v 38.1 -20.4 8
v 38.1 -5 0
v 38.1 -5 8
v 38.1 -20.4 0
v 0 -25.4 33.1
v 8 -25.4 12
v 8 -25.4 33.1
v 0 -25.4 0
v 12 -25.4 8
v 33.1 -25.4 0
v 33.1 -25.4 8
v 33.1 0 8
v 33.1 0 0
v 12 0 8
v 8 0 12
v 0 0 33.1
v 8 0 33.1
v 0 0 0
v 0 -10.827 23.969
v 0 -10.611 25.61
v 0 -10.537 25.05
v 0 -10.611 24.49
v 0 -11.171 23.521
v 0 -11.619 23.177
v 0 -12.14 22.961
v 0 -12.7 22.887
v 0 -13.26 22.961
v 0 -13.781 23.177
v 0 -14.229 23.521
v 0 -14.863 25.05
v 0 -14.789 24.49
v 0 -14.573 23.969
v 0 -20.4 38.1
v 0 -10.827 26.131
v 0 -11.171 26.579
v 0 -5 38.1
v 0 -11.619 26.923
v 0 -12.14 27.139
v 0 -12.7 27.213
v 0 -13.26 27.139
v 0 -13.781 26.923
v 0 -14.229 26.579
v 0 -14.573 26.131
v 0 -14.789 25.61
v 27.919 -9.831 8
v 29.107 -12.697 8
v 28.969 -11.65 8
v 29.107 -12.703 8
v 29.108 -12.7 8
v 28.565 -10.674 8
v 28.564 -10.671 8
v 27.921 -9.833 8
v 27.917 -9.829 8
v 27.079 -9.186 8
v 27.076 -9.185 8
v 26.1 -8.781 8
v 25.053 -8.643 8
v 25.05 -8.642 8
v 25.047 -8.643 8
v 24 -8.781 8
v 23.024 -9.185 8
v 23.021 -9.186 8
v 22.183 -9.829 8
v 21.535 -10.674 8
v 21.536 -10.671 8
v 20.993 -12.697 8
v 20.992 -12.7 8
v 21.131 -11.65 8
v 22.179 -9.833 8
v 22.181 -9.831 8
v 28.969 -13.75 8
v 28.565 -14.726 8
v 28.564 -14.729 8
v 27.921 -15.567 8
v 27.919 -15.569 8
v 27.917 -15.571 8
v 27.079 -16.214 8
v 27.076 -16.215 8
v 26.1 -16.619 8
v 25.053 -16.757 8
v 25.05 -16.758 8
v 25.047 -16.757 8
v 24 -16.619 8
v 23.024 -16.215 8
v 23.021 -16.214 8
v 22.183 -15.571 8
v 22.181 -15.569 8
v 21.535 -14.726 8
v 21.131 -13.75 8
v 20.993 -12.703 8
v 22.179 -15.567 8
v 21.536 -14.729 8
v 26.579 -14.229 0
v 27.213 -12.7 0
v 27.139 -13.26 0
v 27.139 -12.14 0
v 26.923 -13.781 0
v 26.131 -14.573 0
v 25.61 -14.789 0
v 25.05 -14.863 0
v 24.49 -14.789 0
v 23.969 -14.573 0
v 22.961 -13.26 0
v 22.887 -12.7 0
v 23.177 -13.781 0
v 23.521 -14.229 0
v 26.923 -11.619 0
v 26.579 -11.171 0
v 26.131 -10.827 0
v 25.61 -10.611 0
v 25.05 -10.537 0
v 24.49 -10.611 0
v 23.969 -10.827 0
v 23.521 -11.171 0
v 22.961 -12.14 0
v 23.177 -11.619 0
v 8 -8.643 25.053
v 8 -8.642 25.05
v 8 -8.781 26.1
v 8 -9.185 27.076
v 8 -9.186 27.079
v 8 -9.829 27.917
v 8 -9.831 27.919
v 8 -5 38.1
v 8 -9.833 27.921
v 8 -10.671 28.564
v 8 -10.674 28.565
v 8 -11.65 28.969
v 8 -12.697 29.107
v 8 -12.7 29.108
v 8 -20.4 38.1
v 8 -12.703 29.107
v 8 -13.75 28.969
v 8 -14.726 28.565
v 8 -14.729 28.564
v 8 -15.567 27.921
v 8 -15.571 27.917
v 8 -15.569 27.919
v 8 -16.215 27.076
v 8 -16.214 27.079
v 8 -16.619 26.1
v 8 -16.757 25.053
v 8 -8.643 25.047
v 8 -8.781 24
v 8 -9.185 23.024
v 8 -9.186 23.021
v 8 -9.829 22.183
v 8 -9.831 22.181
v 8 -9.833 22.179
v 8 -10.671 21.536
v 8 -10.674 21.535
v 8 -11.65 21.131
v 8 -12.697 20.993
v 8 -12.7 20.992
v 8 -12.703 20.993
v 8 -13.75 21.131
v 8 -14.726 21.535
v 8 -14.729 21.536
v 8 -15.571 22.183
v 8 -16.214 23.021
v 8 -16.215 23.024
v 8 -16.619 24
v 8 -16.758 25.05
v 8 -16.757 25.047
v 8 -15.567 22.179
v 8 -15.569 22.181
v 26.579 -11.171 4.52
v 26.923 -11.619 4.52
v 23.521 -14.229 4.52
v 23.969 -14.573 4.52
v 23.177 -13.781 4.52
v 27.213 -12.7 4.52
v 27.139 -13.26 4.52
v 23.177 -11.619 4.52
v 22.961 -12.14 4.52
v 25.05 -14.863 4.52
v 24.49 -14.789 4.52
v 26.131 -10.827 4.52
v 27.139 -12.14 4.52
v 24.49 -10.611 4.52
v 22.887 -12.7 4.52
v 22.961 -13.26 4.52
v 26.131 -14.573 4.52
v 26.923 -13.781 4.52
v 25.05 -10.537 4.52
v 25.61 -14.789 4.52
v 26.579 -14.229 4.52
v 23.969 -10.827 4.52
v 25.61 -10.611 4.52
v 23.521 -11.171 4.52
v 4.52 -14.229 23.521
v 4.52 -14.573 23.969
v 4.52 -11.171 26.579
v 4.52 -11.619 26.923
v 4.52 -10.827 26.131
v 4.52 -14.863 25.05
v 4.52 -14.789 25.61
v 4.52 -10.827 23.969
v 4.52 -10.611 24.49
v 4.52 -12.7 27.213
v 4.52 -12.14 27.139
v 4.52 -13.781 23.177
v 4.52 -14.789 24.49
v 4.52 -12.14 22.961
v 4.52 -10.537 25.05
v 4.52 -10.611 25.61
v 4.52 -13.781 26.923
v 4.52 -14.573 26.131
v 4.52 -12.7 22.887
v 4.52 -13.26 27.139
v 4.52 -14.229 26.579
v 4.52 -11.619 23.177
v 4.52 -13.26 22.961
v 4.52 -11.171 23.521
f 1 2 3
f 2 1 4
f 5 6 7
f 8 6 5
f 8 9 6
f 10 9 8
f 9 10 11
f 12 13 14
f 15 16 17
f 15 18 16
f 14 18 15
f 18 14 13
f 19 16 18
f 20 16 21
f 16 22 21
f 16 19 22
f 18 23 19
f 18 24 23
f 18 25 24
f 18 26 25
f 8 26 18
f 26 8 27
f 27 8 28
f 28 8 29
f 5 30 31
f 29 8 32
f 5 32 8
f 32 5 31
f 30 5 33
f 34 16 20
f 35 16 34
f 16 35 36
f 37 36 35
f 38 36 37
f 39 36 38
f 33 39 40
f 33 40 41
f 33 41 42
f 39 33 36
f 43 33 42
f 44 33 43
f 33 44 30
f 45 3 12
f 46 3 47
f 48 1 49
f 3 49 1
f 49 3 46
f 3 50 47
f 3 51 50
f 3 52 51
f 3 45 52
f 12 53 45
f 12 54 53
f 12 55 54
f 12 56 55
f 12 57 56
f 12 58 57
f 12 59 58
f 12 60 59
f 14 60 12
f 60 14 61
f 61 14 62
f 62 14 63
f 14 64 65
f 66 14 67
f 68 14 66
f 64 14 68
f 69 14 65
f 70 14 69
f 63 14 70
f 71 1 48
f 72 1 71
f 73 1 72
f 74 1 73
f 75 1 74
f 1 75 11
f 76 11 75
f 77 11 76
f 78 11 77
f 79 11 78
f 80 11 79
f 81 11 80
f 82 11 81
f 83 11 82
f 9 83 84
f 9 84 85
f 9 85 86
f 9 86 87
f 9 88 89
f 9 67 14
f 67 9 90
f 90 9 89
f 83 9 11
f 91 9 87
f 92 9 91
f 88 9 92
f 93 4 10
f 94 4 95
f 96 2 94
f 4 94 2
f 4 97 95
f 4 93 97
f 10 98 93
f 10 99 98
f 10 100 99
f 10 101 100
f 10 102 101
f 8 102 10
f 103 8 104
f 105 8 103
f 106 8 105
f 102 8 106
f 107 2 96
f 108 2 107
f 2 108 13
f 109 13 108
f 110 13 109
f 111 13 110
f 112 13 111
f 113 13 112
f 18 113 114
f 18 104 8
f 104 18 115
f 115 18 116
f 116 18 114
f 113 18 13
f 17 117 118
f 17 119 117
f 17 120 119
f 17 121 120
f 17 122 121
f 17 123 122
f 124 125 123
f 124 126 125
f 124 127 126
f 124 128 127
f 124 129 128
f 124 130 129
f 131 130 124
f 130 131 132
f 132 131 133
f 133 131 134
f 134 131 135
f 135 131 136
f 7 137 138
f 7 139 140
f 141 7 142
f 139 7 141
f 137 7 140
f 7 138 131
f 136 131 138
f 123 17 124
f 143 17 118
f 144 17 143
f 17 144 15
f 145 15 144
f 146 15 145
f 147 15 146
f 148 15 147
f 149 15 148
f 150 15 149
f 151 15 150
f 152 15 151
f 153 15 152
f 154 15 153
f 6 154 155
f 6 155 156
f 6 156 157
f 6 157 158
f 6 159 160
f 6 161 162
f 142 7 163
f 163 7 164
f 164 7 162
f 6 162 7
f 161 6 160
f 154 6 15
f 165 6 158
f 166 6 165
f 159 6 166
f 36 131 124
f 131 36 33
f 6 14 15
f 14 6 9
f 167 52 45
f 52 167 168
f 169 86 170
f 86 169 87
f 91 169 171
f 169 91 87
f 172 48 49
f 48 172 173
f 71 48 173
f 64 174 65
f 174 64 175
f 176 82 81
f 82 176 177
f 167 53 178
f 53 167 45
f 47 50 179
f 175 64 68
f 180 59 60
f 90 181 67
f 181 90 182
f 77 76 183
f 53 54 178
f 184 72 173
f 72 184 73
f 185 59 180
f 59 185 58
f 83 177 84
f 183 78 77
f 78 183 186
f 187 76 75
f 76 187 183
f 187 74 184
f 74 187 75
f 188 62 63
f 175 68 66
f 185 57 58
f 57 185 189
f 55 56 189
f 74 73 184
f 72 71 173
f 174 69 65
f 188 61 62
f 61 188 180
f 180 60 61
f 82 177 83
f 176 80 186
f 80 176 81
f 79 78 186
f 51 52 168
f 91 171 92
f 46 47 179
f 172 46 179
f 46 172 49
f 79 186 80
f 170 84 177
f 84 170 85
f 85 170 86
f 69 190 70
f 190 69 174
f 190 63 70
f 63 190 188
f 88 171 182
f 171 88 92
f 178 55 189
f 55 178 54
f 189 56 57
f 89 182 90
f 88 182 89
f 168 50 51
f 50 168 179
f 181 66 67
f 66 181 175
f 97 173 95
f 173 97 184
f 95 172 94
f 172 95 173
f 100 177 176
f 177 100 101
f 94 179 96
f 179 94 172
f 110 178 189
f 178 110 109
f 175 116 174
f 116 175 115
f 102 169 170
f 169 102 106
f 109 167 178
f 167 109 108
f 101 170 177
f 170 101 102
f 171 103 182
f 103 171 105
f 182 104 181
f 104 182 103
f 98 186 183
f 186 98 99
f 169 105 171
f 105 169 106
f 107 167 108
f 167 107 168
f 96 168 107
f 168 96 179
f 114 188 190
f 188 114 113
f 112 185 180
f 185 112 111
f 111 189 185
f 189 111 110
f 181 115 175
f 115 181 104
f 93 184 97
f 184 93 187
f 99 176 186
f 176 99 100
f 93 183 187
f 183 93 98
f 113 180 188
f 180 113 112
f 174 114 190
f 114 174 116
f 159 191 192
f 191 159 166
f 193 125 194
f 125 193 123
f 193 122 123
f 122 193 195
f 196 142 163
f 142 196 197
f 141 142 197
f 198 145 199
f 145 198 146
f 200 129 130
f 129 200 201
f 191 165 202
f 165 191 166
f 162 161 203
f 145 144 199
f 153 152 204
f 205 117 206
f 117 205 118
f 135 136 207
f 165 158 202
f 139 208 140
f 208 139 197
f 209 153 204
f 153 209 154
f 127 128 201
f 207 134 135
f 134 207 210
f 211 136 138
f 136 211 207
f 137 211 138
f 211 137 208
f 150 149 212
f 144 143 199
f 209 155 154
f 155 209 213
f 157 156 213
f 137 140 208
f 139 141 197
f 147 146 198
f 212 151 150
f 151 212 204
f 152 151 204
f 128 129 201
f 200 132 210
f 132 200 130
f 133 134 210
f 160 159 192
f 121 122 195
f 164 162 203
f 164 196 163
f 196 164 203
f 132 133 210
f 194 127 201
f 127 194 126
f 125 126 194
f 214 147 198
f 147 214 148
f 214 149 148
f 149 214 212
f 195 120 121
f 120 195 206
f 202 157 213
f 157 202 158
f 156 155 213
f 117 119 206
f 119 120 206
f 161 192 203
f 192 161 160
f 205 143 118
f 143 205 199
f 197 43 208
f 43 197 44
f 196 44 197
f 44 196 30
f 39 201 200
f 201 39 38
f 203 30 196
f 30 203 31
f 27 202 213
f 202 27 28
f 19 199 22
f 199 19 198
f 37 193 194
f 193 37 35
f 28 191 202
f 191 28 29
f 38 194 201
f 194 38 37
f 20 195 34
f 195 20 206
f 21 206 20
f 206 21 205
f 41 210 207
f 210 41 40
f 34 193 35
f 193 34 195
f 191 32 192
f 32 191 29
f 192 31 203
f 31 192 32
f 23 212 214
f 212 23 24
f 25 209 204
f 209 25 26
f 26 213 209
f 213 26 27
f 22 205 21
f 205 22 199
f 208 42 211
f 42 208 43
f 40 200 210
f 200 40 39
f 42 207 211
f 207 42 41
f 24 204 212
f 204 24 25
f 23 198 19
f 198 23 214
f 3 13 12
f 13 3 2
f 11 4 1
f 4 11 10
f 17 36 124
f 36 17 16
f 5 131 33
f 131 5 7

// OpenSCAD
//Parametric L Bracket
//You can make this any length, Width, Height & Thickness you want
//You can also have 1, 2 or 4 screws on each leg of the L
//8/19/2015 By: David Bunch
//
//CUSTOMIZER VARIABLES

//1. Length of Part along 1st L
Len = 38.1;

//2. Width of L along 2nd L
Wid = 38.1;

//3. Height of L Bracket
Ht = 25.4;

//4. Thickness of Leg along X-Axis
Thk_X = 8;

//5. Thickness of Leg along Y-axis
Thk_Y = 8;

//6. Weld Diameter at L junction
WeldDia = 8;

//7. Chamfer Diameter at ends of L
ChamfDia = 10;

//8. Hole Diameter for Screws (#8 screw default)
HoleSize = 4.2;            //#10 Screws are 4.5 measured
                            //#8 Screws are 4.2 measured
                            //#6 Screws are 3.4 measured

//9. Dia. of Taper Head of Screw (#8 used for default)
TaperDia = 7.9;             //#10 Screws are a measured 9.0mm dia
                            //#8 Screws are a measured 7.95mm dia
                            //#6 Screws are a measured 6.45mm dia
//10. Taper Length Head of Screw (#8 used for default)
TaperLen = 3.5;            //#10 Screws are a measured 3.9mm taper
                            //#8 Screws are a measured 3.5mm taper
                            //#6 Screws are a measured 2.66mm taper
//11. Multiplication factor for Drill Holes
Tolerance = 1.03;  

//12. # of Screws on each side of L (1 or 2)
Screws_X = 1;                 //I split the distance by 3 for 2 screws

//13. # of Screws on each side of L (1 or 2)
Screws_Y = 1;                 //I split the distance by 3 for 2 screws

//14. # of Scres along Height of L (1 or 2)
Screws_Z = 1;

//15. Screw Height (I use 3/4" screws for default)
ScrewHt = 19.02;

//16. # of parts to make (1,2,3 or 4)
Parts = 1;

//CUSTOMIZER VARIABLES END

HoleOD = HoleSize * Tolerance;      //Calculated Hole Diameter
TapOD = TaperDia * Tolerance;       //Calculated Tapered Head Diameter
WeldRad = WeldDia / 2;              //Radius of Weld
Ht2 = Ht / (Screws_Z + 1);          //Half Height or 1/3 height if 2 screws are used
echo("Ht2 = ", Ht2);
//Calcs for Hole(s) along X axis
H_X = (Len - Thk_Y - WeldRad) / (Screws_X + 1);
echo("H_X = ",H_X);
Hole_X =  H_X + Thk_Y + WeldRad;
echo("Hole_X = ",Hole_X);
Hole_X2 = Hole_X + H_X;
echo("Hole_X2 = ",Hole_X2);
//
//Calcs for Hole(s) along Y axis
H_Y = (Wid - Thk_X - WeldRad) / (Screws_Y + 1);
echo("H_Y = ",H_Y);
Hole_Y = H_Y + Thk_X + WeldRad;
echo("Hole_Y = ",Hole_Y);
Hole_Y2 = Hole_Y + H_Y;
echo("Hole_Y2 = ",Hole_Y2);
//
ScrewThreadHt = ScrewHt - TaperLen;
module DrawSrewCut()
{
//This combines the head to the screw
	union()
	{
		cylinder(d1=TapOD,d2=HoleOD,h=TaperLen,$fn=24);
		cylinder(d=HoleOD,h=ScrewThreadHt,$fn=24);
	}
}
module LBracket()
{
    union()
    {
        cube([Len,Thk_X,Ht]);         //Draw the X axis side
        cube([Thk_Y,Wid,Ht]);         //Draw the Y axis side
        translate([Thk_Y,Thk_X,0])
        cylinder(d=WeldDia,h=Ht,$fn=4);     //Add the Weld
    }
}
module ChamCorners()
{
//Chamfer at end of X Length
    translate([Len,-1,0])
    rotate([-90,0,0])
    cylinder(d=ChamfDia,h=Thk_X+2,$fn=4);
    translate([Len,-1,Ht])
    rotate([-90,0,0])
    cylinder(d=ChamfDia,h=Thk_X+2,$fn=4);
//Chamfer at end of Y Length
    translate([-1,Wid,0])
    rotate([0,90,0])
    cylinder(d=ChamfDia,h=Thk_Y+2,$fn=4);
    translate([-1,Wid,Ht])
    rotate([0,90,0])
    cylinder(d=ChamfDia,h=Thk_Y+2,$fn=4);
}
module Screws_XY()
{
//Drill holes for Screws along the X & Y axis
    translate([Hole_X,Thk_X+.02,Ht2])
    rotate([90,0,0])
    DrawSrewCut();
    if (Screws_X == 2)
    {
        translate([Hole_X2,Thk_X+.02,Ht2])
        rotate([90,0,0])
        DrawSrewCut();
    }
    translate([Thk_Y+.02,Hole_Y,Ht2])
    rotate([0,-90,0])
    DrawSrewCut();
    if (Screws_Y == 2)
    {
        translate([Thk_Y+.02,Hole_Y2,Ht2])
        rotate([0,-90,0])
        DrawSrewCut();
    }
}
module DrawL()
{
    rotate([90,0,0])
    difference()
    {
        LBracket();
        Screws_XY();
        if (Screws_Z == 2)
        {
            translate([0,0,Ht2])
            Screws_XY();
        }
        ChamCorners();
//The following section is only for visual checks of how far screws go into wood
//These will not draw on final render
        translate([0,-12.7,0])
        %cube([Hole_X,12.7,38.1]);          //Check how far screw goes into 1/2" wood
        translate([-19.02,0,0])
        %cube([19.02,Hole_Y,38.1]);         //Check how far screw goes into 3/4" wood
        translate([Hole_X,Thk_X+.02,Ht2])
        rotate([90,0,0])
        color("red")
        %DrawSrewCut();
        translate([Thk_Y+.02,Hole_Y,Ht2])
        rotate([0,-90,0])
        color("red")
        %DrawSrewCut();
    }
}
DrawL();                                //Always draw 1 Part
if (Parts > 1)
{
    translate([0,Ht+6,0])
    DrawL();
}
if (Parts > 2)
{
    translate([0,Ht+Ht+6+6,0])
    DrawL();
}
if (Parts > 3)
{
    translate([0,Ht+Ht+Ht+6+6+6,0])
    DrawL();
}
